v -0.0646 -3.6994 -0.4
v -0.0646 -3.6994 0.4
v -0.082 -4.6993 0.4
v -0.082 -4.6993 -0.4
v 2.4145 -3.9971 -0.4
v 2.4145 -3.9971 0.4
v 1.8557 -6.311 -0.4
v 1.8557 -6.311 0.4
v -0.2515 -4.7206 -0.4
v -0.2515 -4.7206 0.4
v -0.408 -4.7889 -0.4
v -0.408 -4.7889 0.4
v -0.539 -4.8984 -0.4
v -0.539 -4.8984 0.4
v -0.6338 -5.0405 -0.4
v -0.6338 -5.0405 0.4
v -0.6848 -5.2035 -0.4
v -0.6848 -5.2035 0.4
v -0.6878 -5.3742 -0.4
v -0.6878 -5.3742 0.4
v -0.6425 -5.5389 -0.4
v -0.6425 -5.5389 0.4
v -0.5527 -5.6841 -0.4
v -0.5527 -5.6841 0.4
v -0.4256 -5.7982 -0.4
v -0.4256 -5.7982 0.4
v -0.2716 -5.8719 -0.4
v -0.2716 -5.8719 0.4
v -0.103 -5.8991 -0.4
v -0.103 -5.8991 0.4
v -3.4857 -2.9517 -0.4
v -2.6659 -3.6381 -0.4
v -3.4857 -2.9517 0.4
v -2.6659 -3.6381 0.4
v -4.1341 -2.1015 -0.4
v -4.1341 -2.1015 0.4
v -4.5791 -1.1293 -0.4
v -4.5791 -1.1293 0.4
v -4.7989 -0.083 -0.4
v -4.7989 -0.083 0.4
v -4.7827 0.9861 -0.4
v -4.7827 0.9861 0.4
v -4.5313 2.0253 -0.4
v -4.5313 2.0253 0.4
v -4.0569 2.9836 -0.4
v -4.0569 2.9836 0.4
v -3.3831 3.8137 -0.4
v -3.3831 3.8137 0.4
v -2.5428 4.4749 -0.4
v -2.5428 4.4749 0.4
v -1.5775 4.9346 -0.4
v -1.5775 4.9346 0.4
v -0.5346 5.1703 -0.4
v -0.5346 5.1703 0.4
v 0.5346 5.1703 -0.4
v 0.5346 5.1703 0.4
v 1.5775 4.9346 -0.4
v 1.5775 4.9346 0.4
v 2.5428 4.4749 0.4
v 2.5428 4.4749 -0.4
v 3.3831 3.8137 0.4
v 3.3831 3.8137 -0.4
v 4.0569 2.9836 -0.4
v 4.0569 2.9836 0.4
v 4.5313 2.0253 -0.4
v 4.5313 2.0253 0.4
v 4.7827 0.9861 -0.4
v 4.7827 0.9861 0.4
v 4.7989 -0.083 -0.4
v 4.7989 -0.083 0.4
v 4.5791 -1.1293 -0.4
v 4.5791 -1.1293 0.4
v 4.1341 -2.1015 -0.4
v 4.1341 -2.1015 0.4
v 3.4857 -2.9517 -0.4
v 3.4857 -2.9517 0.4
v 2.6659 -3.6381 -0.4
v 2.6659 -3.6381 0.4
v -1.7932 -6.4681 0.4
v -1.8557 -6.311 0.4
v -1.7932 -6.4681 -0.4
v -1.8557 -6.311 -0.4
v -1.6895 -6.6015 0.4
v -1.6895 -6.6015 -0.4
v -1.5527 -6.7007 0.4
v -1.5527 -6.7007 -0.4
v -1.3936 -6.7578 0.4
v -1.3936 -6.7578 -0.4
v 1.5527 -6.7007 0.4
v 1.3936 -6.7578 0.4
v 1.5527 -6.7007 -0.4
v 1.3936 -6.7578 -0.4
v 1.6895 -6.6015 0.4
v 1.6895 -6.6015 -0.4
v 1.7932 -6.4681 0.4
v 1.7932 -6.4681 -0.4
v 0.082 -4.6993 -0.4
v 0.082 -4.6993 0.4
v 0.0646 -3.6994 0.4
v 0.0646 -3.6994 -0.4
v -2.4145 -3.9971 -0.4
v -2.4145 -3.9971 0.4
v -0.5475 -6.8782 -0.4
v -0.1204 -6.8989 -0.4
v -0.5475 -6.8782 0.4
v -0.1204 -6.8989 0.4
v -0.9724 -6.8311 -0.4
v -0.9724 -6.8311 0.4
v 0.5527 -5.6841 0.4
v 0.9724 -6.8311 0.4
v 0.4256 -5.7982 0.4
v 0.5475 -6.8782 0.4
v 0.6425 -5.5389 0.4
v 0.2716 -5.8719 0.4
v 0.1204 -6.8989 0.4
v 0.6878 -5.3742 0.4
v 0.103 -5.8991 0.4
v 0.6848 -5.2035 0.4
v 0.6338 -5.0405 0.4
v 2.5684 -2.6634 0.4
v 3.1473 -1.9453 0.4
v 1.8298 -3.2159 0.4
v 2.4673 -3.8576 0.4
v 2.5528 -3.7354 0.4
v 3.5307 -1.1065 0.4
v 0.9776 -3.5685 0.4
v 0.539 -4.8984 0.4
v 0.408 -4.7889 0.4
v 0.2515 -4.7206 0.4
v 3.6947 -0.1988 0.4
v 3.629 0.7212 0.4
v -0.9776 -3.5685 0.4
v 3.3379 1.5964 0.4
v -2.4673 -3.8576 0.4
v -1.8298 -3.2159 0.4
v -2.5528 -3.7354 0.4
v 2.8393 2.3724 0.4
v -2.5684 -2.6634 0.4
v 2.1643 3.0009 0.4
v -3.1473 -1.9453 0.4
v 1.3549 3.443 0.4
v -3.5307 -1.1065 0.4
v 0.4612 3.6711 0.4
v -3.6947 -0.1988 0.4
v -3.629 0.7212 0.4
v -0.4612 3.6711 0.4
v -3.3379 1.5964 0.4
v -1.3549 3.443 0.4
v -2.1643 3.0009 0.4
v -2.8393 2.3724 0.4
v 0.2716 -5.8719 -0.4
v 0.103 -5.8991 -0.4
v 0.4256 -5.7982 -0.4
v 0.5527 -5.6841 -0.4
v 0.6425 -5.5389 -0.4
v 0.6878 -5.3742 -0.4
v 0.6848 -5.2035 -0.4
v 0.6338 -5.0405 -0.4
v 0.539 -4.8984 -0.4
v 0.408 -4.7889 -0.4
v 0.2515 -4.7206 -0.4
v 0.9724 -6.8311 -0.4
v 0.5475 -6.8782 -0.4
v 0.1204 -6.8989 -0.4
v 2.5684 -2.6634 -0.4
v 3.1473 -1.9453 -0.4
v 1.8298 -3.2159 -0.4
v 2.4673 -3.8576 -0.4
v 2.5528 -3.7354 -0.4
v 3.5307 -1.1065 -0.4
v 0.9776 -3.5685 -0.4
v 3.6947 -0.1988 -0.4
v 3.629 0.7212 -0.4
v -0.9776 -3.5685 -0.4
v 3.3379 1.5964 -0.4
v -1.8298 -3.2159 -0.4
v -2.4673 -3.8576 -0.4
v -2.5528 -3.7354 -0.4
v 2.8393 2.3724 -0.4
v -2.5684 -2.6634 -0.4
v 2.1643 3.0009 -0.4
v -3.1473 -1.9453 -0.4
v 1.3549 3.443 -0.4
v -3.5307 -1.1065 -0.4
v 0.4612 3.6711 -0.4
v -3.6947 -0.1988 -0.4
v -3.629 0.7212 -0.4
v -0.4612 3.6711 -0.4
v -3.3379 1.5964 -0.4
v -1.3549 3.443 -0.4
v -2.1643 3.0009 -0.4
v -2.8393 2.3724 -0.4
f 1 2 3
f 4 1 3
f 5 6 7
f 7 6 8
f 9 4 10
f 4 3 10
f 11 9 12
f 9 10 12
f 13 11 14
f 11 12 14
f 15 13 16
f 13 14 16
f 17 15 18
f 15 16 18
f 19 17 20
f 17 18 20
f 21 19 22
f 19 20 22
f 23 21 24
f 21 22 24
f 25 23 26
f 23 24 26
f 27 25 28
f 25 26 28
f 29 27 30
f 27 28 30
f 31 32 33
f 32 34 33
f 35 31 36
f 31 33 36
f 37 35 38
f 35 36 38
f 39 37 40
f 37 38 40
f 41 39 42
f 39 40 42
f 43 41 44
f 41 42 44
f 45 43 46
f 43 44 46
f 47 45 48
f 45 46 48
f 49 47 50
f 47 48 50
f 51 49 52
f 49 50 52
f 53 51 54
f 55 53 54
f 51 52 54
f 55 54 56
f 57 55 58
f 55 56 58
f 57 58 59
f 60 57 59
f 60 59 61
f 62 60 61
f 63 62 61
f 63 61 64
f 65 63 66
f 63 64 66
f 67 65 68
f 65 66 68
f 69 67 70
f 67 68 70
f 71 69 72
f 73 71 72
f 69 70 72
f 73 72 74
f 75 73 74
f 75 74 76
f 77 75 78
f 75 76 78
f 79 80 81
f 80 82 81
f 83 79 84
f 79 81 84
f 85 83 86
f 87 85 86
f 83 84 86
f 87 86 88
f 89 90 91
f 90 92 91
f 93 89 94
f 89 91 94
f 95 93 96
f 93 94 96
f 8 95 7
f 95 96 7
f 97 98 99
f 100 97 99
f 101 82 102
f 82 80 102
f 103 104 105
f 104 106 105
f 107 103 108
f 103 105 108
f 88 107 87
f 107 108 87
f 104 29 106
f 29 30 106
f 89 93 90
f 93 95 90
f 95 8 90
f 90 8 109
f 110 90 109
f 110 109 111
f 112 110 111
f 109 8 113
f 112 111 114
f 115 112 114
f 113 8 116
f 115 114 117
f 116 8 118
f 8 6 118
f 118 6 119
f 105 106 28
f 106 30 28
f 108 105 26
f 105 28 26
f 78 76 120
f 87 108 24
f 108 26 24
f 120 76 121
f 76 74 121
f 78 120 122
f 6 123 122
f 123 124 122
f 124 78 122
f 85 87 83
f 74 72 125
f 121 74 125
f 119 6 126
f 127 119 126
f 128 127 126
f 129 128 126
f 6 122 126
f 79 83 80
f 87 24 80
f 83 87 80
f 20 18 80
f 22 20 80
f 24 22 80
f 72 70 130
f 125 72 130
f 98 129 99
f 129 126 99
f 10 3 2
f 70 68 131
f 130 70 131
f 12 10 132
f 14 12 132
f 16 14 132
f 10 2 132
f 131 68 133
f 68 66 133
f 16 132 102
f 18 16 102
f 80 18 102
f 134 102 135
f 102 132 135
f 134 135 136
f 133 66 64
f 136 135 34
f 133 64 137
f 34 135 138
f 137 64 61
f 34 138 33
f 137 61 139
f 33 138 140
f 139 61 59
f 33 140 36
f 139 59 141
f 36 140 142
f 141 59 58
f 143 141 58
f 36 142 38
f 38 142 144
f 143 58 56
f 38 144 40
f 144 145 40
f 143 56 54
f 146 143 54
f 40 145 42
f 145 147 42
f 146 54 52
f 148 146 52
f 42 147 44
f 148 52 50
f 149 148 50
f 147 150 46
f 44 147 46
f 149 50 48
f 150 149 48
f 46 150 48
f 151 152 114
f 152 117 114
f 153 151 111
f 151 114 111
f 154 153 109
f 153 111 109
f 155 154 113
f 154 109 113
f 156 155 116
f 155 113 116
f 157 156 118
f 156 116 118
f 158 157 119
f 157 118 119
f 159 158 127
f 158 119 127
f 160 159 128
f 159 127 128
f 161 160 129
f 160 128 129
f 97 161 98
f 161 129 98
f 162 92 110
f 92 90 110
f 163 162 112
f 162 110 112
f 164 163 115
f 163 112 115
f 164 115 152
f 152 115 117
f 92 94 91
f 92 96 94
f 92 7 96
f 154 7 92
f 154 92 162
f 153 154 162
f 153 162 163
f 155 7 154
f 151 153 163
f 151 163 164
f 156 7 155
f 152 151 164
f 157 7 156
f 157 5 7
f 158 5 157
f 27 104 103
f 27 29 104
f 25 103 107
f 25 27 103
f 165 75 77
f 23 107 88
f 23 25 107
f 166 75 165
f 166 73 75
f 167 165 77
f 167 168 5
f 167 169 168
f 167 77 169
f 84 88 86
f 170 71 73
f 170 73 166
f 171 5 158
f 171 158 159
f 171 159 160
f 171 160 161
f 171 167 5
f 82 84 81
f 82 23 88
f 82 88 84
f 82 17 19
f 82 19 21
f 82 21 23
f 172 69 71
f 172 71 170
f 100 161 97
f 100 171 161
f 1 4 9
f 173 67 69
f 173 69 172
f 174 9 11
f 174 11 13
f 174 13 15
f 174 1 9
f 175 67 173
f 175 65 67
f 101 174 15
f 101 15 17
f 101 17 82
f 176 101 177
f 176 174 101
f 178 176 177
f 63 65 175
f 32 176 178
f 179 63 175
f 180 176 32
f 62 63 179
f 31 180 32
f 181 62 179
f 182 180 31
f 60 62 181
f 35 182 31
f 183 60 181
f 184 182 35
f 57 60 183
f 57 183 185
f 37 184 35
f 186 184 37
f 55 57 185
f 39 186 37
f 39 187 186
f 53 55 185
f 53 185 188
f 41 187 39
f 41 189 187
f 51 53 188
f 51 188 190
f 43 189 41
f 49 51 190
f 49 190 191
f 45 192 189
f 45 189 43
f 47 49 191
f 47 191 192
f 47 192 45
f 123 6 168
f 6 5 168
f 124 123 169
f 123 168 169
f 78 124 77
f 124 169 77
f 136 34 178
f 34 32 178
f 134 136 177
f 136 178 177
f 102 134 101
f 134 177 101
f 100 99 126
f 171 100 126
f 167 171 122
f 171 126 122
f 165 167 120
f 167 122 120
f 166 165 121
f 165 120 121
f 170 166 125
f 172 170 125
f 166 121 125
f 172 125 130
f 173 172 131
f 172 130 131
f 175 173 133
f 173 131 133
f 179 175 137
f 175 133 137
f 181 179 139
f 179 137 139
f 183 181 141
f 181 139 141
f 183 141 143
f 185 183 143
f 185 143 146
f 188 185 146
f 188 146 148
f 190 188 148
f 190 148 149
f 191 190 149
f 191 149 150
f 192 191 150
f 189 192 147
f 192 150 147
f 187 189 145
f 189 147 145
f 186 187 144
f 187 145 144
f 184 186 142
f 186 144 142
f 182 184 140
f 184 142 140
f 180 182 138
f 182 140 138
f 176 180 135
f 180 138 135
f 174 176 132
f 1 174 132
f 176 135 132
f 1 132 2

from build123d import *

# Parameters (mm, degrees)
BOSS_EXTRUDE1_DEPTH = 0.4
FILLET1_R           = 0.6


with BuildPart() as part:
    # Sketch1 → Boss-Extrude1 (new, symmetric)
    with BuildSketch(Plane.XY):
        with BuildLine():
            Line((-0.064573904, -3.699436472), (-0.08202631, -4.699284167))
            ThreePointArc((-0.08202631, -4.699284167), (-0.692406371, -5.28872134), (-0.102969198, -5.899101401))
            Line((-0.102969198, -5.899101401), (-0.120421604, -6.898949097))
            ThreePointArc((-0.120421604, -6.898949097), (-0.95172367, -6.834048731), (-1.769127189, -6.669346969))
            Line((-1.769127189, -6.669346969), (-2.471645104, -3.760448175))
            ThreePointArc((-2.471645104, -3.760448175), (0, 5.2), (2.471645104, -3.760448175))
            Line((2.471645104, -3.760448175), (1.769127189, -6.669346969))
            ThreePointArc((1.769127189, -6.669346969), (0.95172367, -6.834048731), (0.120421604, -6.898949097))
            Line((0.120421604, -6.898949097), (0.102969198, -5.899101401))
            ThreePointArc((0.102969198, -5.899101401), (0.692406371, -5.28872134), (0.08202631, -4.699284167))
            Line((0.08202631, -4.699284167), (0.064573904, -3.699436472))
            ThreePointArc((0.064573904, -3.699436472), (0, 3.7), (-0.064573904, -3.699436472))
        make_face()
    extrude(amount=BOSS_EXTRUDE1_DEPTH, both=True)

    # Fillet1
    fillet1_edges = [part.edges().sort_by_distance(p)[0] for p in [
        (-1.769127189, -6.669346969, 0),
        (-2.471645104, -3.760448175, 0),
        (2.471645104, -3.760448175, 0),
        (1.769127189, -6.669346969, 0),
    ]]
    fillet(fillet1_edges, radius=FILLET1_R)


solid = part.part
